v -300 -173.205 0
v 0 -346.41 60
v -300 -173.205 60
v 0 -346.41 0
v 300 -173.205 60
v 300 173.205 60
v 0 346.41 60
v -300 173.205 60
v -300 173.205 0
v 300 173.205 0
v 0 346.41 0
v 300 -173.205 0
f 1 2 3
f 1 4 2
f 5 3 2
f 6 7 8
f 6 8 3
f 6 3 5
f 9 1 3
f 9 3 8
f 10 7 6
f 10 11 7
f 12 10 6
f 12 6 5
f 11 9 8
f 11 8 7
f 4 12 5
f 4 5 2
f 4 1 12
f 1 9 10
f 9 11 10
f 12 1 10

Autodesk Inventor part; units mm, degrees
ref_plane "YZ Plane" through (0, 0, 0) normal (1, 0, 0) x (0, 1, 0)
ref_plane "XZ Plane" through (0, 0, 0) normal (0, 1, 0) x (-1, 0, 0)
ref_plane "Work Plane1" through (0, 0, 0) normal (0, 0, 1) x (1, 0, 0)
sketch "Sketch1" plane through (0, 0, 0) normal (0, 0, 1) x (1, 0, 0)
  line L0 (300, -173.2051) -> (0, -346.4102)
  line L1 (0, -346.4102) -> (-300, -173.2051)
  line L2 (-300, -173.2051) -> (-300, 173.2051)
  line L3 (-300, 173.2051) -> (0, 346.4102)
  line L4 (0, 346.4102) -> (300, 173.2051)
  line L5 (300, 173.2051) -> (300, -173.2051)
  point P0 (0, 0)
  point P1 (0, 0)
  dimension "d0" = 300
extrude "Extrusion1" add sketch "Sketch1" along normal blind 60
properties part number "Gel" material "Phenolic Resin"
